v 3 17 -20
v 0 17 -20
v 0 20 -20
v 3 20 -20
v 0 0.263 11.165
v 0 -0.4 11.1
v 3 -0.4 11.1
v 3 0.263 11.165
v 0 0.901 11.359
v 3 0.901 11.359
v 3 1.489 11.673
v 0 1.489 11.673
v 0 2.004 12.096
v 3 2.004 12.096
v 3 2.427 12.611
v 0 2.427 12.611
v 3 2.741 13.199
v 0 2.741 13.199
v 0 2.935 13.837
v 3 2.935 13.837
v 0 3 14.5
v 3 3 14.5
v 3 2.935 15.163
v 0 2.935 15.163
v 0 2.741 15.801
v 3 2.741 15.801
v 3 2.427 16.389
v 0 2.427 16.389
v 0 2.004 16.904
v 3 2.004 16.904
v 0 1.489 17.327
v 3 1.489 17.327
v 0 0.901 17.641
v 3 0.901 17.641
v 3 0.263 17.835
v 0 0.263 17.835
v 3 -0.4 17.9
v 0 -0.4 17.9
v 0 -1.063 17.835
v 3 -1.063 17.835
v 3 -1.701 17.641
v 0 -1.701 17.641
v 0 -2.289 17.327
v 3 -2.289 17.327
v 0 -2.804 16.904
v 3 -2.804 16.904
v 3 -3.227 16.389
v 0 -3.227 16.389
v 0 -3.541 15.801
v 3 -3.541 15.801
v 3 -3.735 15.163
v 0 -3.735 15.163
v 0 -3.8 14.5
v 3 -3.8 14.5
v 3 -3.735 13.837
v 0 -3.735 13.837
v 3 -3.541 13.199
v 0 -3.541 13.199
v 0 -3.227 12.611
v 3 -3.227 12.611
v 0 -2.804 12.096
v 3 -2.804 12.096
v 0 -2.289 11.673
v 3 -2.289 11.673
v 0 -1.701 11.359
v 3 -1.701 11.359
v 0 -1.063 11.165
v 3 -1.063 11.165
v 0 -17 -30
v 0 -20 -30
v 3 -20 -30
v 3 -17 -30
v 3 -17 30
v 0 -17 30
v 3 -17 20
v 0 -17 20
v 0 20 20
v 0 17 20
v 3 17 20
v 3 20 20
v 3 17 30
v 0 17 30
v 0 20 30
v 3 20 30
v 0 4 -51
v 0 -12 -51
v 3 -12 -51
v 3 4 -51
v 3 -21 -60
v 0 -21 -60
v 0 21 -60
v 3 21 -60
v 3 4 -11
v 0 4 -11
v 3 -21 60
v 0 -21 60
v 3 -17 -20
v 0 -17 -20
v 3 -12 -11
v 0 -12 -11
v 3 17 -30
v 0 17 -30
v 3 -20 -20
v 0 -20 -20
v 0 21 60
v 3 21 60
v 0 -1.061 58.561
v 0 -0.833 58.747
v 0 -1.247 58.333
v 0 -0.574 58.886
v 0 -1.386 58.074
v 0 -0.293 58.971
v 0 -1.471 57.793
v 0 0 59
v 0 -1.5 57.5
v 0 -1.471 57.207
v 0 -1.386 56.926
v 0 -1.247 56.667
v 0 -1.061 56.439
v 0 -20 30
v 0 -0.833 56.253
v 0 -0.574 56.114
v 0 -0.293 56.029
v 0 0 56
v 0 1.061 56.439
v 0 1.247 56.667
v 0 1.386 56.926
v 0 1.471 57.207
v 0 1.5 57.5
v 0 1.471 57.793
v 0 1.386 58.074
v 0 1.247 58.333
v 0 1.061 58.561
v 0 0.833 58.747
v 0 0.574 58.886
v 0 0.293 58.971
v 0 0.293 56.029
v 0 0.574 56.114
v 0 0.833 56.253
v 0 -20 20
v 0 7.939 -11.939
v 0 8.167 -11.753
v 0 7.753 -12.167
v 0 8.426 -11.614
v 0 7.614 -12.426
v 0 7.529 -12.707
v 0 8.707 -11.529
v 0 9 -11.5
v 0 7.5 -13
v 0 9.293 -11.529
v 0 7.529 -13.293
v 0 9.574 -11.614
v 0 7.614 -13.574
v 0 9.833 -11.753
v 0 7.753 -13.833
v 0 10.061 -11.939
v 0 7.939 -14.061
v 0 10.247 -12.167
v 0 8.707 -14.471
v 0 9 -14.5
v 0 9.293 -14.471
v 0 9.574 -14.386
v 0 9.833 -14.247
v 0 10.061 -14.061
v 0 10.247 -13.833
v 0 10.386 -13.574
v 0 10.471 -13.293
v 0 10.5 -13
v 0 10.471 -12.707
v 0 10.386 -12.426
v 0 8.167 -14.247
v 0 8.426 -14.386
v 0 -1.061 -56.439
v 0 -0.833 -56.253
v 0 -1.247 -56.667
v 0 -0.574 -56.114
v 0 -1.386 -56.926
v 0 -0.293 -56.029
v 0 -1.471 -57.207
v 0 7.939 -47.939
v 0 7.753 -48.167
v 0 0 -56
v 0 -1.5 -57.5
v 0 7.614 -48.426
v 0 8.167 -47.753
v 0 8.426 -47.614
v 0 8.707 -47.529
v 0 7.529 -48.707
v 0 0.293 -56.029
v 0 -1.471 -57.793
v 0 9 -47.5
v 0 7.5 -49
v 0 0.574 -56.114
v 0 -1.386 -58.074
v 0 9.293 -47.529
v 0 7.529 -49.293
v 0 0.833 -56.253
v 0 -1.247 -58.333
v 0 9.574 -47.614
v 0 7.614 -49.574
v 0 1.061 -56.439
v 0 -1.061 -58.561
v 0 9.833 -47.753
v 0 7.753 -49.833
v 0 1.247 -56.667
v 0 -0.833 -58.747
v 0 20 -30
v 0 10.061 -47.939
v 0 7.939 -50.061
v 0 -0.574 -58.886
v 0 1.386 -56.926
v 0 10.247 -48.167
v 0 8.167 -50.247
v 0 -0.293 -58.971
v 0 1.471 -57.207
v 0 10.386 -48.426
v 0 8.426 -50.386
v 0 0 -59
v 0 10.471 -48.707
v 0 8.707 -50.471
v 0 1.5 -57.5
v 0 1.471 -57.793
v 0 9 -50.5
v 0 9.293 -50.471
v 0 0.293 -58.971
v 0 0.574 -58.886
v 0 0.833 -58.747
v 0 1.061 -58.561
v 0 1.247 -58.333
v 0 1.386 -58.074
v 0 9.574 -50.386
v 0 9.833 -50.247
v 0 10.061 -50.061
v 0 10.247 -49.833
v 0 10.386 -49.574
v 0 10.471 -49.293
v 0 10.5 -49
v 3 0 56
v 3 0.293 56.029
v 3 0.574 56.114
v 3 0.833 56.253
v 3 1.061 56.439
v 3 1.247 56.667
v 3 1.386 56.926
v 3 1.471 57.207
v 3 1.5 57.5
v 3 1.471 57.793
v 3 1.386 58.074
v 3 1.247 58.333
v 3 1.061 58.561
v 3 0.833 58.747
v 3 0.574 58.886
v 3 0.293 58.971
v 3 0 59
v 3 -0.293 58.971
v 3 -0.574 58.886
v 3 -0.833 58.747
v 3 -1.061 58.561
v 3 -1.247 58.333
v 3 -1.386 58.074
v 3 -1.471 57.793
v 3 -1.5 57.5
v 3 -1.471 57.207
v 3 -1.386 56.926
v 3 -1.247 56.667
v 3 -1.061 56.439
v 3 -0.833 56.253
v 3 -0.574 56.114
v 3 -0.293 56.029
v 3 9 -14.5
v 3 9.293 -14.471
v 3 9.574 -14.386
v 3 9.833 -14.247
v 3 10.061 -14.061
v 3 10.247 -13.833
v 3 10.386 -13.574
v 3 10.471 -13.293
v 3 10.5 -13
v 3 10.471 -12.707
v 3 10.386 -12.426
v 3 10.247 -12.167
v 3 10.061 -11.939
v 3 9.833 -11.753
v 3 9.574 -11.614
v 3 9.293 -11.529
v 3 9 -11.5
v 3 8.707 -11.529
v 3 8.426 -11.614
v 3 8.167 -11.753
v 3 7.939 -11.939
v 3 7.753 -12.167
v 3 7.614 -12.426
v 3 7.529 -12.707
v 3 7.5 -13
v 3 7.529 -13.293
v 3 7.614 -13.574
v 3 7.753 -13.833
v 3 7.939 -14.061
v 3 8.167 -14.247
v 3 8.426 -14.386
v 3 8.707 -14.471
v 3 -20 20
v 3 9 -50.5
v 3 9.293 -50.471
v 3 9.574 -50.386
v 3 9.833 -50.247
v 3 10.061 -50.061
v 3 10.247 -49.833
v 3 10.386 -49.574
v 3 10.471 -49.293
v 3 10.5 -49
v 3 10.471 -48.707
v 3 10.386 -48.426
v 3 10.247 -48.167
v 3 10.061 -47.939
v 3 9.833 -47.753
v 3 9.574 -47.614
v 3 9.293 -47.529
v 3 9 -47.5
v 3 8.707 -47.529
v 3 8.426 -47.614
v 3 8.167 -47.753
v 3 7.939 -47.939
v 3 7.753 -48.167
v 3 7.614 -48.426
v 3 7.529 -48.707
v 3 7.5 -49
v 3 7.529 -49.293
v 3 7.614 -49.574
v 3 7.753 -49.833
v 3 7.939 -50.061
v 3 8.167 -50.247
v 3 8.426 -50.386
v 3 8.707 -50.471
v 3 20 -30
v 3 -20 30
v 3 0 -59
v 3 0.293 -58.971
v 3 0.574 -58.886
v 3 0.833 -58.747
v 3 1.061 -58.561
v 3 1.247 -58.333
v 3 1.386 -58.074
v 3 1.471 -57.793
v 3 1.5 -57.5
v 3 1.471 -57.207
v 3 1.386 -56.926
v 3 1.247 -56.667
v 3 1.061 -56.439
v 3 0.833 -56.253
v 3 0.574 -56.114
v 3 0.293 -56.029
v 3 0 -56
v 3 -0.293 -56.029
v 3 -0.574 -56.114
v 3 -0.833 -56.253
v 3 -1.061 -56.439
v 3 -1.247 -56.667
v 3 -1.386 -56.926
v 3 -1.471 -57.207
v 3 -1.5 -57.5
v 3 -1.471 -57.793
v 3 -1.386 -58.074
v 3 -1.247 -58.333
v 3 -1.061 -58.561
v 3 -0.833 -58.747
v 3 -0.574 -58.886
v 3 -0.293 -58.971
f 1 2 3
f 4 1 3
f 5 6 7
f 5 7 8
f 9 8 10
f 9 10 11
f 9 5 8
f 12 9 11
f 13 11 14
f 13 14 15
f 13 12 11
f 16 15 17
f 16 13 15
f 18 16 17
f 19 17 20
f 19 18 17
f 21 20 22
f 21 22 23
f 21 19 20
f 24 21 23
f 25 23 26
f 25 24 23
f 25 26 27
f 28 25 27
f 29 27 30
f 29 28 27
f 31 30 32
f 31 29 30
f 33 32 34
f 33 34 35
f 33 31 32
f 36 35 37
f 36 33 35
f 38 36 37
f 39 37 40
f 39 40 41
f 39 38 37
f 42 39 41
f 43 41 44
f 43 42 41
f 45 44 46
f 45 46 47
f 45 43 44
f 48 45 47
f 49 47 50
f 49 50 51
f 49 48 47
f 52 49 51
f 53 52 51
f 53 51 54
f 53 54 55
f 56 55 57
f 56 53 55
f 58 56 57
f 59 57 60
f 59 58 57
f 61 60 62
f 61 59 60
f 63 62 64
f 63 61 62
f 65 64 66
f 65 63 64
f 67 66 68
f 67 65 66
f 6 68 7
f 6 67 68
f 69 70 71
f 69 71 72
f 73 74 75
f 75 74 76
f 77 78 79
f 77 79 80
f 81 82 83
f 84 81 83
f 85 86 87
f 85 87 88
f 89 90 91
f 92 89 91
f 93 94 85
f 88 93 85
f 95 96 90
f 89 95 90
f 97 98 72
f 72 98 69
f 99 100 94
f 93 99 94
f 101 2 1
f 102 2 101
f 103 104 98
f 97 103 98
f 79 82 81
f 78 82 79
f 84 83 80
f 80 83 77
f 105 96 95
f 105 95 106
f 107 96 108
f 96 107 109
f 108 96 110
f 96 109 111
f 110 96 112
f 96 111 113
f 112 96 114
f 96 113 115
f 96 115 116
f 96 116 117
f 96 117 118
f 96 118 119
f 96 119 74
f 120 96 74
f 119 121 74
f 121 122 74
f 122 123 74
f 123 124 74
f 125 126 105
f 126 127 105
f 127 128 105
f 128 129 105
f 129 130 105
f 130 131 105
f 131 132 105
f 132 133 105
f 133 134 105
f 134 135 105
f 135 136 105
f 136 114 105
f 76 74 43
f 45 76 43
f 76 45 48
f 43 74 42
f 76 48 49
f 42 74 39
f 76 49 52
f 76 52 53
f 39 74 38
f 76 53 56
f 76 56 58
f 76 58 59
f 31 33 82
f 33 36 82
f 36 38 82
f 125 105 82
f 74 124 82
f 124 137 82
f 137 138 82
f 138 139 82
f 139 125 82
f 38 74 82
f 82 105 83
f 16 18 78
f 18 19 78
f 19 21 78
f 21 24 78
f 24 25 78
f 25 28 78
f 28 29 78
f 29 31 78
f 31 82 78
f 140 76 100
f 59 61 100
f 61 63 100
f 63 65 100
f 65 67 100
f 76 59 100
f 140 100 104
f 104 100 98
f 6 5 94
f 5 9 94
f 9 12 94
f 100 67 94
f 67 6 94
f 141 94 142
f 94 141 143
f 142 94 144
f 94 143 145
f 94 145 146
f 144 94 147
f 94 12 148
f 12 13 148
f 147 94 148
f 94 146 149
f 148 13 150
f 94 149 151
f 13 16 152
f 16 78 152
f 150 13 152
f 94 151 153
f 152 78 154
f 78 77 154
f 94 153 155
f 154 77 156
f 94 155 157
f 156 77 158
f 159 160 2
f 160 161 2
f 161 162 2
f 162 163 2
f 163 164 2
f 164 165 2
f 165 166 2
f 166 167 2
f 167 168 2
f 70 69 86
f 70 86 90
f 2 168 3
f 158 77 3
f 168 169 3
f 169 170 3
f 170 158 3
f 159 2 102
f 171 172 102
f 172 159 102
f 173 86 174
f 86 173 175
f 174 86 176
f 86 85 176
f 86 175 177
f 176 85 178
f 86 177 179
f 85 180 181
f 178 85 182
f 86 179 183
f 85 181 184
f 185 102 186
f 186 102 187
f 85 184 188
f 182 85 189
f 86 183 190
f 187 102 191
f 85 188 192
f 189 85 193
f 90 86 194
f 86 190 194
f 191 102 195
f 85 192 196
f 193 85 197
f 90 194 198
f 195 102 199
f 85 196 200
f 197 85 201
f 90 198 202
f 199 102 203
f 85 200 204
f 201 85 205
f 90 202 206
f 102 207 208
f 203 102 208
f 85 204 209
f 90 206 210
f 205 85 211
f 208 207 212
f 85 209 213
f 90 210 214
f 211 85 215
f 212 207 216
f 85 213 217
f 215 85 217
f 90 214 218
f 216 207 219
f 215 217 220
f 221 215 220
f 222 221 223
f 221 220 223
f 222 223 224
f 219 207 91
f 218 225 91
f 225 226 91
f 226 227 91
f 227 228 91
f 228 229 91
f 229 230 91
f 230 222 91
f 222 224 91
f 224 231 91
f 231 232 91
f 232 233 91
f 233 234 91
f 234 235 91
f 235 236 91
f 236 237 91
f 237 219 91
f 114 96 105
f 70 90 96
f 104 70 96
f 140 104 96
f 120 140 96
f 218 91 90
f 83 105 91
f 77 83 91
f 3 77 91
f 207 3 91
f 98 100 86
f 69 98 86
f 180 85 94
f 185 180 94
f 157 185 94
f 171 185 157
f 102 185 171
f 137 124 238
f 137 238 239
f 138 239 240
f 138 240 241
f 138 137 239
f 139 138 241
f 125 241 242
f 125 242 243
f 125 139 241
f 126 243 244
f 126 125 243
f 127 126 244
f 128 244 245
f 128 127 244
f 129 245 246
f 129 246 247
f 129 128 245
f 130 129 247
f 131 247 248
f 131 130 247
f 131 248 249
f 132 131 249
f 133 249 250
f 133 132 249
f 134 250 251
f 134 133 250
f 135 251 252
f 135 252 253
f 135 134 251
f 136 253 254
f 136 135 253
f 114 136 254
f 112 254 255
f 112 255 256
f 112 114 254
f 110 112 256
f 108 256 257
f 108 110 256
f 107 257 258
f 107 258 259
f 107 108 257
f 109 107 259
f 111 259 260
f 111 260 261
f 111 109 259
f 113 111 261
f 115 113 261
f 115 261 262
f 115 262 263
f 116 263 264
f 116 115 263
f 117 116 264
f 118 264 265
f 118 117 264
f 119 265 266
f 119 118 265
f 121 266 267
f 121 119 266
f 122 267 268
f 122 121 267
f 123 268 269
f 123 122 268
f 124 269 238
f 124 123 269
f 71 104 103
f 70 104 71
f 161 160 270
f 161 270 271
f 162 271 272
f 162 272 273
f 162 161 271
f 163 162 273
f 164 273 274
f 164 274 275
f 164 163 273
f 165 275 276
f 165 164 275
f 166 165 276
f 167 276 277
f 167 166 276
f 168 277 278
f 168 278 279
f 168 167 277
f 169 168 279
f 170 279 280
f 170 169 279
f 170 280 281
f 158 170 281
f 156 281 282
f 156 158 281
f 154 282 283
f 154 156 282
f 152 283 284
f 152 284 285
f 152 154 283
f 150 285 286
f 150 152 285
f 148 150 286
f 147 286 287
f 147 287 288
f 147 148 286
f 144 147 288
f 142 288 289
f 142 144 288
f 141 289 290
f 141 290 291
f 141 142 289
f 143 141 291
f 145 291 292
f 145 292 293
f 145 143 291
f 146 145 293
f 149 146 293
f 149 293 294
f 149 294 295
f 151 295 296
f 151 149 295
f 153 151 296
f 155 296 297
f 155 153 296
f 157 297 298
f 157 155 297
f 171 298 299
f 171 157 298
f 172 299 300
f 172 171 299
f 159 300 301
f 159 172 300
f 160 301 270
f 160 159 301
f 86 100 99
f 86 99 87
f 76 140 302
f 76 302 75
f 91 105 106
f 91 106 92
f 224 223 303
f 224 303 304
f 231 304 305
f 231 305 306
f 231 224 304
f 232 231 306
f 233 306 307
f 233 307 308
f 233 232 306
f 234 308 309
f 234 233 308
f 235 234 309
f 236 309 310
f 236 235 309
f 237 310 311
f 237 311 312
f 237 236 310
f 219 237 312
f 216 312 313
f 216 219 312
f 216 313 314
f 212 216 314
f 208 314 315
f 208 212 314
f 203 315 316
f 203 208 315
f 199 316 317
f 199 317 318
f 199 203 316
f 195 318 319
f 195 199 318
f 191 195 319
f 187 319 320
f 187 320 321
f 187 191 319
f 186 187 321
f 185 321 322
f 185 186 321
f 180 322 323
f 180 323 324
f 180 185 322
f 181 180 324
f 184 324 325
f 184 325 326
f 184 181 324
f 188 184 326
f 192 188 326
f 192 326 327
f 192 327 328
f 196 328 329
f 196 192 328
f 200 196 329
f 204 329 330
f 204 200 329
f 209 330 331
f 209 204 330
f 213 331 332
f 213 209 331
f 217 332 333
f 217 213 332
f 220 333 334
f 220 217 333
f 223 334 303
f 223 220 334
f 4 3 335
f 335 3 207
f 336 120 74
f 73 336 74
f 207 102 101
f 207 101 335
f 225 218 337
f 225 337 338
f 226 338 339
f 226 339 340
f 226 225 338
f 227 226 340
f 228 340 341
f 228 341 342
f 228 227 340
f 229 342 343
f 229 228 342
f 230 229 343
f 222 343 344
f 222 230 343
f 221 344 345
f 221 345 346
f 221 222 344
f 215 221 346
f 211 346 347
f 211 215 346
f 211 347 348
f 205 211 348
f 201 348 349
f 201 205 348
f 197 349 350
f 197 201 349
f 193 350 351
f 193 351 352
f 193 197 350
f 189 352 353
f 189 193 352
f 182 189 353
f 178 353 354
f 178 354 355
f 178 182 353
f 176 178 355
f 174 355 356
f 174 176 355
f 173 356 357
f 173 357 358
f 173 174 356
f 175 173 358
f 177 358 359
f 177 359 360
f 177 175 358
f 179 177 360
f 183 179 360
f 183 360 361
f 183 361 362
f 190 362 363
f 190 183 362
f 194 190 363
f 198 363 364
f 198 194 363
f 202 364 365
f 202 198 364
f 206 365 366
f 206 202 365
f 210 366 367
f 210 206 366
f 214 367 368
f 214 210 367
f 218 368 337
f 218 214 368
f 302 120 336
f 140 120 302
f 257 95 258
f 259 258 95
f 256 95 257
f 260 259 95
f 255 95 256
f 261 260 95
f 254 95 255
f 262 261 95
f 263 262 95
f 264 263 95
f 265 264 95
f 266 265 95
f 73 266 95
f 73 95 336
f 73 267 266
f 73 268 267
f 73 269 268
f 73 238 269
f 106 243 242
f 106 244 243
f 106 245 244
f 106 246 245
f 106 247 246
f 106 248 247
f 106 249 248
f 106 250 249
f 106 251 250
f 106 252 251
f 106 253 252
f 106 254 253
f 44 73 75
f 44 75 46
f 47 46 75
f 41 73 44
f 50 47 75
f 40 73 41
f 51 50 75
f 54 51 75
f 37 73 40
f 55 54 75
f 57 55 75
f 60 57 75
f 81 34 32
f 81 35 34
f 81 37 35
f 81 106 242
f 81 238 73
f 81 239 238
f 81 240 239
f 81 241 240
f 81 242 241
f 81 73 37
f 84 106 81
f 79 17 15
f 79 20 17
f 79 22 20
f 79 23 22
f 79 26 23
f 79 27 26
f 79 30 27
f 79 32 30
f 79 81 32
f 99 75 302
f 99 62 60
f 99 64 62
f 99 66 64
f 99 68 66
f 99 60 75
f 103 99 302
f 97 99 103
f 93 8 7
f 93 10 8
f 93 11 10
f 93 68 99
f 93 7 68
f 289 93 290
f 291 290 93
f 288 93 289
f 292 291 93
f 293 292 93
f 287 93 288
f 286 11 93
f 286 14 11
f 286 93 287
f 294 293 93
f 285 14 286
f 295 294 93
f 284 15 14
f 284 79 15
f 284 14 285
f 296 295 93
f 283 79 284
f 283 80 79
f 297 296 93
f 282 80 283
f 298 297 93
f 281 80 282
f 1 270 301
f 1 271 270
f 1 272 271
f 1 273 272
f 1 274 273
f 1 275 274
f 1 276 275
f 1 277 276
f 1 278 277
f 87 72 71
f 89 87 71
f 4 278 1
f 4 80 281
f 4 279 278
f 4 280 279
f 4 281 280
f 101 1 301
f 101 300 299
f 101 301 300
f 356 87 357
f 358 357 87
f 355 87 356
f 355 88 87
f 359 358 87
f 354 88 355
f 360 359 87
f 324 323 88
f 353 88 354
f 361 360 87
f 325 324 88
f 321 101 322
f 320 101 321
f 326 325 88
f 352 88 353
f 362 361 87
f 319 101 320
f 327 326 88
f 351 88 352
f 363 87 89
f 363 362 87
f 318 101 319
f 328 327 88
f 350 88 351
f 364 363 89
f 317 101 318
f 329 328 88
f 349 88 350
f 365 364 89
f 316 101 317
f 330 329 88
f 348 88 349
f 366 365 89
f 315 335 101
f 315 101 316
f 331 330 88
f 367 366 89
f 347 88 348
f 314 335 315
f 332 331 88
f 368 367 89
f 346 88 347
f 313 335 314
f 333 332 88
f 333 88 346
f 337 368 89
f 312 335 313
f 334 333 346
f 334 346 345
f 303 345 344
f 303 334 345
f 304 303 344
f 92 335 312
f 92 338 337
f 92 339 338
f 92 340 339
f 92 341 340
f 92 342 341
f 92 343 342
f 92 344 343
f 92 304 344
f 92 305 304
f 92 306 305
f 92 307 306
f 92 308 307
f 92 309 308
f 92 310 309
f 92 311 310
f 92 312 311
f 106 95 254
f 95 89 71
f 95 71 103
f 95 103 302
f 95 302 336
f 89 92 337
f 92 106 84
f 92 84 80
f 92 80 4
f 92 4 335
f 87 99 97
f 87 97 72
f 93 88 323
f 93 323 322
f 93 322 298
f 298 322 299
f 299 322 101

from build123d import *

# Parameters (mm, degrees)
SKETCH1_W           = 120
SKETCH1_H           = 42
SKETCH1_R           = 1.5
SKETCH1_R_2         = 3.4
SKETCH1_W_2         = 10
SKETCH1_H_2         = 3
SKETCH1_W_3         = 40
SKETCH1_H_3         = 16
BOSS_EXTRUDE1_DEPTH = 3


with BuildPart() as part:
    # Sketch1 → Boss-Extrude1 (new body)
    with BuildSketch(Plane(origin=(0, 0, 0), x_dir=(0, 0, -1), z_dir=(1, 0, 0))):
        Rectangle(SKETCH1_W, SKETCH1_H)
        with Locations((49, 9)):
            Circle(SKETCH1_R, mode=Mode.SUBTRACT)
        with Locations((13, 9)):
            Circle(SKETCH1_R, mode=Mode.SUBTRACT)
        with Locations((-14.5, -0.4)):
            Circle(SKETCH1_R_2, mode=Mode.SUBTRACT)
        with Locations((57.5, 0)):
            Circle(SKETCH1_R, mode=Mode.SUBTRACT)
        with Locations((-57.5, 0)):
            Circle(SKETCH1_R, mode=Mode.SUBTRACT)
        with Locations((25, -18.5)):
            Rectangle(SKETCH1_W_2, SKETCH1_H_2, mode=Mode.SUBTRACT)
        with Locations((-25, -18.5)):
            Rectangle(SKETCH1_W_2, SKETCH1_H_2, mode=Mode.SUBTRACT)
        with Locations((25, 18.5)):
            Rectangle(SKETCH1_W_2, SKETCH1_H_2, mode=Mode.SUBTRACT)
        with Locations((-25, 18.5)):
            Rectangle(SKETCH1_W_2, SKETCH1_H_2, mode=Mode.SUBTRACT)
        with Locations((31, -4)):
            Rectangle(SKETCH1_W_3, SKETCH1_H_3, mode=Mode.SUBTRACT)
    extrude(amount=BOSS_EXTRUDE1_DEPTH)


solid = part.part
